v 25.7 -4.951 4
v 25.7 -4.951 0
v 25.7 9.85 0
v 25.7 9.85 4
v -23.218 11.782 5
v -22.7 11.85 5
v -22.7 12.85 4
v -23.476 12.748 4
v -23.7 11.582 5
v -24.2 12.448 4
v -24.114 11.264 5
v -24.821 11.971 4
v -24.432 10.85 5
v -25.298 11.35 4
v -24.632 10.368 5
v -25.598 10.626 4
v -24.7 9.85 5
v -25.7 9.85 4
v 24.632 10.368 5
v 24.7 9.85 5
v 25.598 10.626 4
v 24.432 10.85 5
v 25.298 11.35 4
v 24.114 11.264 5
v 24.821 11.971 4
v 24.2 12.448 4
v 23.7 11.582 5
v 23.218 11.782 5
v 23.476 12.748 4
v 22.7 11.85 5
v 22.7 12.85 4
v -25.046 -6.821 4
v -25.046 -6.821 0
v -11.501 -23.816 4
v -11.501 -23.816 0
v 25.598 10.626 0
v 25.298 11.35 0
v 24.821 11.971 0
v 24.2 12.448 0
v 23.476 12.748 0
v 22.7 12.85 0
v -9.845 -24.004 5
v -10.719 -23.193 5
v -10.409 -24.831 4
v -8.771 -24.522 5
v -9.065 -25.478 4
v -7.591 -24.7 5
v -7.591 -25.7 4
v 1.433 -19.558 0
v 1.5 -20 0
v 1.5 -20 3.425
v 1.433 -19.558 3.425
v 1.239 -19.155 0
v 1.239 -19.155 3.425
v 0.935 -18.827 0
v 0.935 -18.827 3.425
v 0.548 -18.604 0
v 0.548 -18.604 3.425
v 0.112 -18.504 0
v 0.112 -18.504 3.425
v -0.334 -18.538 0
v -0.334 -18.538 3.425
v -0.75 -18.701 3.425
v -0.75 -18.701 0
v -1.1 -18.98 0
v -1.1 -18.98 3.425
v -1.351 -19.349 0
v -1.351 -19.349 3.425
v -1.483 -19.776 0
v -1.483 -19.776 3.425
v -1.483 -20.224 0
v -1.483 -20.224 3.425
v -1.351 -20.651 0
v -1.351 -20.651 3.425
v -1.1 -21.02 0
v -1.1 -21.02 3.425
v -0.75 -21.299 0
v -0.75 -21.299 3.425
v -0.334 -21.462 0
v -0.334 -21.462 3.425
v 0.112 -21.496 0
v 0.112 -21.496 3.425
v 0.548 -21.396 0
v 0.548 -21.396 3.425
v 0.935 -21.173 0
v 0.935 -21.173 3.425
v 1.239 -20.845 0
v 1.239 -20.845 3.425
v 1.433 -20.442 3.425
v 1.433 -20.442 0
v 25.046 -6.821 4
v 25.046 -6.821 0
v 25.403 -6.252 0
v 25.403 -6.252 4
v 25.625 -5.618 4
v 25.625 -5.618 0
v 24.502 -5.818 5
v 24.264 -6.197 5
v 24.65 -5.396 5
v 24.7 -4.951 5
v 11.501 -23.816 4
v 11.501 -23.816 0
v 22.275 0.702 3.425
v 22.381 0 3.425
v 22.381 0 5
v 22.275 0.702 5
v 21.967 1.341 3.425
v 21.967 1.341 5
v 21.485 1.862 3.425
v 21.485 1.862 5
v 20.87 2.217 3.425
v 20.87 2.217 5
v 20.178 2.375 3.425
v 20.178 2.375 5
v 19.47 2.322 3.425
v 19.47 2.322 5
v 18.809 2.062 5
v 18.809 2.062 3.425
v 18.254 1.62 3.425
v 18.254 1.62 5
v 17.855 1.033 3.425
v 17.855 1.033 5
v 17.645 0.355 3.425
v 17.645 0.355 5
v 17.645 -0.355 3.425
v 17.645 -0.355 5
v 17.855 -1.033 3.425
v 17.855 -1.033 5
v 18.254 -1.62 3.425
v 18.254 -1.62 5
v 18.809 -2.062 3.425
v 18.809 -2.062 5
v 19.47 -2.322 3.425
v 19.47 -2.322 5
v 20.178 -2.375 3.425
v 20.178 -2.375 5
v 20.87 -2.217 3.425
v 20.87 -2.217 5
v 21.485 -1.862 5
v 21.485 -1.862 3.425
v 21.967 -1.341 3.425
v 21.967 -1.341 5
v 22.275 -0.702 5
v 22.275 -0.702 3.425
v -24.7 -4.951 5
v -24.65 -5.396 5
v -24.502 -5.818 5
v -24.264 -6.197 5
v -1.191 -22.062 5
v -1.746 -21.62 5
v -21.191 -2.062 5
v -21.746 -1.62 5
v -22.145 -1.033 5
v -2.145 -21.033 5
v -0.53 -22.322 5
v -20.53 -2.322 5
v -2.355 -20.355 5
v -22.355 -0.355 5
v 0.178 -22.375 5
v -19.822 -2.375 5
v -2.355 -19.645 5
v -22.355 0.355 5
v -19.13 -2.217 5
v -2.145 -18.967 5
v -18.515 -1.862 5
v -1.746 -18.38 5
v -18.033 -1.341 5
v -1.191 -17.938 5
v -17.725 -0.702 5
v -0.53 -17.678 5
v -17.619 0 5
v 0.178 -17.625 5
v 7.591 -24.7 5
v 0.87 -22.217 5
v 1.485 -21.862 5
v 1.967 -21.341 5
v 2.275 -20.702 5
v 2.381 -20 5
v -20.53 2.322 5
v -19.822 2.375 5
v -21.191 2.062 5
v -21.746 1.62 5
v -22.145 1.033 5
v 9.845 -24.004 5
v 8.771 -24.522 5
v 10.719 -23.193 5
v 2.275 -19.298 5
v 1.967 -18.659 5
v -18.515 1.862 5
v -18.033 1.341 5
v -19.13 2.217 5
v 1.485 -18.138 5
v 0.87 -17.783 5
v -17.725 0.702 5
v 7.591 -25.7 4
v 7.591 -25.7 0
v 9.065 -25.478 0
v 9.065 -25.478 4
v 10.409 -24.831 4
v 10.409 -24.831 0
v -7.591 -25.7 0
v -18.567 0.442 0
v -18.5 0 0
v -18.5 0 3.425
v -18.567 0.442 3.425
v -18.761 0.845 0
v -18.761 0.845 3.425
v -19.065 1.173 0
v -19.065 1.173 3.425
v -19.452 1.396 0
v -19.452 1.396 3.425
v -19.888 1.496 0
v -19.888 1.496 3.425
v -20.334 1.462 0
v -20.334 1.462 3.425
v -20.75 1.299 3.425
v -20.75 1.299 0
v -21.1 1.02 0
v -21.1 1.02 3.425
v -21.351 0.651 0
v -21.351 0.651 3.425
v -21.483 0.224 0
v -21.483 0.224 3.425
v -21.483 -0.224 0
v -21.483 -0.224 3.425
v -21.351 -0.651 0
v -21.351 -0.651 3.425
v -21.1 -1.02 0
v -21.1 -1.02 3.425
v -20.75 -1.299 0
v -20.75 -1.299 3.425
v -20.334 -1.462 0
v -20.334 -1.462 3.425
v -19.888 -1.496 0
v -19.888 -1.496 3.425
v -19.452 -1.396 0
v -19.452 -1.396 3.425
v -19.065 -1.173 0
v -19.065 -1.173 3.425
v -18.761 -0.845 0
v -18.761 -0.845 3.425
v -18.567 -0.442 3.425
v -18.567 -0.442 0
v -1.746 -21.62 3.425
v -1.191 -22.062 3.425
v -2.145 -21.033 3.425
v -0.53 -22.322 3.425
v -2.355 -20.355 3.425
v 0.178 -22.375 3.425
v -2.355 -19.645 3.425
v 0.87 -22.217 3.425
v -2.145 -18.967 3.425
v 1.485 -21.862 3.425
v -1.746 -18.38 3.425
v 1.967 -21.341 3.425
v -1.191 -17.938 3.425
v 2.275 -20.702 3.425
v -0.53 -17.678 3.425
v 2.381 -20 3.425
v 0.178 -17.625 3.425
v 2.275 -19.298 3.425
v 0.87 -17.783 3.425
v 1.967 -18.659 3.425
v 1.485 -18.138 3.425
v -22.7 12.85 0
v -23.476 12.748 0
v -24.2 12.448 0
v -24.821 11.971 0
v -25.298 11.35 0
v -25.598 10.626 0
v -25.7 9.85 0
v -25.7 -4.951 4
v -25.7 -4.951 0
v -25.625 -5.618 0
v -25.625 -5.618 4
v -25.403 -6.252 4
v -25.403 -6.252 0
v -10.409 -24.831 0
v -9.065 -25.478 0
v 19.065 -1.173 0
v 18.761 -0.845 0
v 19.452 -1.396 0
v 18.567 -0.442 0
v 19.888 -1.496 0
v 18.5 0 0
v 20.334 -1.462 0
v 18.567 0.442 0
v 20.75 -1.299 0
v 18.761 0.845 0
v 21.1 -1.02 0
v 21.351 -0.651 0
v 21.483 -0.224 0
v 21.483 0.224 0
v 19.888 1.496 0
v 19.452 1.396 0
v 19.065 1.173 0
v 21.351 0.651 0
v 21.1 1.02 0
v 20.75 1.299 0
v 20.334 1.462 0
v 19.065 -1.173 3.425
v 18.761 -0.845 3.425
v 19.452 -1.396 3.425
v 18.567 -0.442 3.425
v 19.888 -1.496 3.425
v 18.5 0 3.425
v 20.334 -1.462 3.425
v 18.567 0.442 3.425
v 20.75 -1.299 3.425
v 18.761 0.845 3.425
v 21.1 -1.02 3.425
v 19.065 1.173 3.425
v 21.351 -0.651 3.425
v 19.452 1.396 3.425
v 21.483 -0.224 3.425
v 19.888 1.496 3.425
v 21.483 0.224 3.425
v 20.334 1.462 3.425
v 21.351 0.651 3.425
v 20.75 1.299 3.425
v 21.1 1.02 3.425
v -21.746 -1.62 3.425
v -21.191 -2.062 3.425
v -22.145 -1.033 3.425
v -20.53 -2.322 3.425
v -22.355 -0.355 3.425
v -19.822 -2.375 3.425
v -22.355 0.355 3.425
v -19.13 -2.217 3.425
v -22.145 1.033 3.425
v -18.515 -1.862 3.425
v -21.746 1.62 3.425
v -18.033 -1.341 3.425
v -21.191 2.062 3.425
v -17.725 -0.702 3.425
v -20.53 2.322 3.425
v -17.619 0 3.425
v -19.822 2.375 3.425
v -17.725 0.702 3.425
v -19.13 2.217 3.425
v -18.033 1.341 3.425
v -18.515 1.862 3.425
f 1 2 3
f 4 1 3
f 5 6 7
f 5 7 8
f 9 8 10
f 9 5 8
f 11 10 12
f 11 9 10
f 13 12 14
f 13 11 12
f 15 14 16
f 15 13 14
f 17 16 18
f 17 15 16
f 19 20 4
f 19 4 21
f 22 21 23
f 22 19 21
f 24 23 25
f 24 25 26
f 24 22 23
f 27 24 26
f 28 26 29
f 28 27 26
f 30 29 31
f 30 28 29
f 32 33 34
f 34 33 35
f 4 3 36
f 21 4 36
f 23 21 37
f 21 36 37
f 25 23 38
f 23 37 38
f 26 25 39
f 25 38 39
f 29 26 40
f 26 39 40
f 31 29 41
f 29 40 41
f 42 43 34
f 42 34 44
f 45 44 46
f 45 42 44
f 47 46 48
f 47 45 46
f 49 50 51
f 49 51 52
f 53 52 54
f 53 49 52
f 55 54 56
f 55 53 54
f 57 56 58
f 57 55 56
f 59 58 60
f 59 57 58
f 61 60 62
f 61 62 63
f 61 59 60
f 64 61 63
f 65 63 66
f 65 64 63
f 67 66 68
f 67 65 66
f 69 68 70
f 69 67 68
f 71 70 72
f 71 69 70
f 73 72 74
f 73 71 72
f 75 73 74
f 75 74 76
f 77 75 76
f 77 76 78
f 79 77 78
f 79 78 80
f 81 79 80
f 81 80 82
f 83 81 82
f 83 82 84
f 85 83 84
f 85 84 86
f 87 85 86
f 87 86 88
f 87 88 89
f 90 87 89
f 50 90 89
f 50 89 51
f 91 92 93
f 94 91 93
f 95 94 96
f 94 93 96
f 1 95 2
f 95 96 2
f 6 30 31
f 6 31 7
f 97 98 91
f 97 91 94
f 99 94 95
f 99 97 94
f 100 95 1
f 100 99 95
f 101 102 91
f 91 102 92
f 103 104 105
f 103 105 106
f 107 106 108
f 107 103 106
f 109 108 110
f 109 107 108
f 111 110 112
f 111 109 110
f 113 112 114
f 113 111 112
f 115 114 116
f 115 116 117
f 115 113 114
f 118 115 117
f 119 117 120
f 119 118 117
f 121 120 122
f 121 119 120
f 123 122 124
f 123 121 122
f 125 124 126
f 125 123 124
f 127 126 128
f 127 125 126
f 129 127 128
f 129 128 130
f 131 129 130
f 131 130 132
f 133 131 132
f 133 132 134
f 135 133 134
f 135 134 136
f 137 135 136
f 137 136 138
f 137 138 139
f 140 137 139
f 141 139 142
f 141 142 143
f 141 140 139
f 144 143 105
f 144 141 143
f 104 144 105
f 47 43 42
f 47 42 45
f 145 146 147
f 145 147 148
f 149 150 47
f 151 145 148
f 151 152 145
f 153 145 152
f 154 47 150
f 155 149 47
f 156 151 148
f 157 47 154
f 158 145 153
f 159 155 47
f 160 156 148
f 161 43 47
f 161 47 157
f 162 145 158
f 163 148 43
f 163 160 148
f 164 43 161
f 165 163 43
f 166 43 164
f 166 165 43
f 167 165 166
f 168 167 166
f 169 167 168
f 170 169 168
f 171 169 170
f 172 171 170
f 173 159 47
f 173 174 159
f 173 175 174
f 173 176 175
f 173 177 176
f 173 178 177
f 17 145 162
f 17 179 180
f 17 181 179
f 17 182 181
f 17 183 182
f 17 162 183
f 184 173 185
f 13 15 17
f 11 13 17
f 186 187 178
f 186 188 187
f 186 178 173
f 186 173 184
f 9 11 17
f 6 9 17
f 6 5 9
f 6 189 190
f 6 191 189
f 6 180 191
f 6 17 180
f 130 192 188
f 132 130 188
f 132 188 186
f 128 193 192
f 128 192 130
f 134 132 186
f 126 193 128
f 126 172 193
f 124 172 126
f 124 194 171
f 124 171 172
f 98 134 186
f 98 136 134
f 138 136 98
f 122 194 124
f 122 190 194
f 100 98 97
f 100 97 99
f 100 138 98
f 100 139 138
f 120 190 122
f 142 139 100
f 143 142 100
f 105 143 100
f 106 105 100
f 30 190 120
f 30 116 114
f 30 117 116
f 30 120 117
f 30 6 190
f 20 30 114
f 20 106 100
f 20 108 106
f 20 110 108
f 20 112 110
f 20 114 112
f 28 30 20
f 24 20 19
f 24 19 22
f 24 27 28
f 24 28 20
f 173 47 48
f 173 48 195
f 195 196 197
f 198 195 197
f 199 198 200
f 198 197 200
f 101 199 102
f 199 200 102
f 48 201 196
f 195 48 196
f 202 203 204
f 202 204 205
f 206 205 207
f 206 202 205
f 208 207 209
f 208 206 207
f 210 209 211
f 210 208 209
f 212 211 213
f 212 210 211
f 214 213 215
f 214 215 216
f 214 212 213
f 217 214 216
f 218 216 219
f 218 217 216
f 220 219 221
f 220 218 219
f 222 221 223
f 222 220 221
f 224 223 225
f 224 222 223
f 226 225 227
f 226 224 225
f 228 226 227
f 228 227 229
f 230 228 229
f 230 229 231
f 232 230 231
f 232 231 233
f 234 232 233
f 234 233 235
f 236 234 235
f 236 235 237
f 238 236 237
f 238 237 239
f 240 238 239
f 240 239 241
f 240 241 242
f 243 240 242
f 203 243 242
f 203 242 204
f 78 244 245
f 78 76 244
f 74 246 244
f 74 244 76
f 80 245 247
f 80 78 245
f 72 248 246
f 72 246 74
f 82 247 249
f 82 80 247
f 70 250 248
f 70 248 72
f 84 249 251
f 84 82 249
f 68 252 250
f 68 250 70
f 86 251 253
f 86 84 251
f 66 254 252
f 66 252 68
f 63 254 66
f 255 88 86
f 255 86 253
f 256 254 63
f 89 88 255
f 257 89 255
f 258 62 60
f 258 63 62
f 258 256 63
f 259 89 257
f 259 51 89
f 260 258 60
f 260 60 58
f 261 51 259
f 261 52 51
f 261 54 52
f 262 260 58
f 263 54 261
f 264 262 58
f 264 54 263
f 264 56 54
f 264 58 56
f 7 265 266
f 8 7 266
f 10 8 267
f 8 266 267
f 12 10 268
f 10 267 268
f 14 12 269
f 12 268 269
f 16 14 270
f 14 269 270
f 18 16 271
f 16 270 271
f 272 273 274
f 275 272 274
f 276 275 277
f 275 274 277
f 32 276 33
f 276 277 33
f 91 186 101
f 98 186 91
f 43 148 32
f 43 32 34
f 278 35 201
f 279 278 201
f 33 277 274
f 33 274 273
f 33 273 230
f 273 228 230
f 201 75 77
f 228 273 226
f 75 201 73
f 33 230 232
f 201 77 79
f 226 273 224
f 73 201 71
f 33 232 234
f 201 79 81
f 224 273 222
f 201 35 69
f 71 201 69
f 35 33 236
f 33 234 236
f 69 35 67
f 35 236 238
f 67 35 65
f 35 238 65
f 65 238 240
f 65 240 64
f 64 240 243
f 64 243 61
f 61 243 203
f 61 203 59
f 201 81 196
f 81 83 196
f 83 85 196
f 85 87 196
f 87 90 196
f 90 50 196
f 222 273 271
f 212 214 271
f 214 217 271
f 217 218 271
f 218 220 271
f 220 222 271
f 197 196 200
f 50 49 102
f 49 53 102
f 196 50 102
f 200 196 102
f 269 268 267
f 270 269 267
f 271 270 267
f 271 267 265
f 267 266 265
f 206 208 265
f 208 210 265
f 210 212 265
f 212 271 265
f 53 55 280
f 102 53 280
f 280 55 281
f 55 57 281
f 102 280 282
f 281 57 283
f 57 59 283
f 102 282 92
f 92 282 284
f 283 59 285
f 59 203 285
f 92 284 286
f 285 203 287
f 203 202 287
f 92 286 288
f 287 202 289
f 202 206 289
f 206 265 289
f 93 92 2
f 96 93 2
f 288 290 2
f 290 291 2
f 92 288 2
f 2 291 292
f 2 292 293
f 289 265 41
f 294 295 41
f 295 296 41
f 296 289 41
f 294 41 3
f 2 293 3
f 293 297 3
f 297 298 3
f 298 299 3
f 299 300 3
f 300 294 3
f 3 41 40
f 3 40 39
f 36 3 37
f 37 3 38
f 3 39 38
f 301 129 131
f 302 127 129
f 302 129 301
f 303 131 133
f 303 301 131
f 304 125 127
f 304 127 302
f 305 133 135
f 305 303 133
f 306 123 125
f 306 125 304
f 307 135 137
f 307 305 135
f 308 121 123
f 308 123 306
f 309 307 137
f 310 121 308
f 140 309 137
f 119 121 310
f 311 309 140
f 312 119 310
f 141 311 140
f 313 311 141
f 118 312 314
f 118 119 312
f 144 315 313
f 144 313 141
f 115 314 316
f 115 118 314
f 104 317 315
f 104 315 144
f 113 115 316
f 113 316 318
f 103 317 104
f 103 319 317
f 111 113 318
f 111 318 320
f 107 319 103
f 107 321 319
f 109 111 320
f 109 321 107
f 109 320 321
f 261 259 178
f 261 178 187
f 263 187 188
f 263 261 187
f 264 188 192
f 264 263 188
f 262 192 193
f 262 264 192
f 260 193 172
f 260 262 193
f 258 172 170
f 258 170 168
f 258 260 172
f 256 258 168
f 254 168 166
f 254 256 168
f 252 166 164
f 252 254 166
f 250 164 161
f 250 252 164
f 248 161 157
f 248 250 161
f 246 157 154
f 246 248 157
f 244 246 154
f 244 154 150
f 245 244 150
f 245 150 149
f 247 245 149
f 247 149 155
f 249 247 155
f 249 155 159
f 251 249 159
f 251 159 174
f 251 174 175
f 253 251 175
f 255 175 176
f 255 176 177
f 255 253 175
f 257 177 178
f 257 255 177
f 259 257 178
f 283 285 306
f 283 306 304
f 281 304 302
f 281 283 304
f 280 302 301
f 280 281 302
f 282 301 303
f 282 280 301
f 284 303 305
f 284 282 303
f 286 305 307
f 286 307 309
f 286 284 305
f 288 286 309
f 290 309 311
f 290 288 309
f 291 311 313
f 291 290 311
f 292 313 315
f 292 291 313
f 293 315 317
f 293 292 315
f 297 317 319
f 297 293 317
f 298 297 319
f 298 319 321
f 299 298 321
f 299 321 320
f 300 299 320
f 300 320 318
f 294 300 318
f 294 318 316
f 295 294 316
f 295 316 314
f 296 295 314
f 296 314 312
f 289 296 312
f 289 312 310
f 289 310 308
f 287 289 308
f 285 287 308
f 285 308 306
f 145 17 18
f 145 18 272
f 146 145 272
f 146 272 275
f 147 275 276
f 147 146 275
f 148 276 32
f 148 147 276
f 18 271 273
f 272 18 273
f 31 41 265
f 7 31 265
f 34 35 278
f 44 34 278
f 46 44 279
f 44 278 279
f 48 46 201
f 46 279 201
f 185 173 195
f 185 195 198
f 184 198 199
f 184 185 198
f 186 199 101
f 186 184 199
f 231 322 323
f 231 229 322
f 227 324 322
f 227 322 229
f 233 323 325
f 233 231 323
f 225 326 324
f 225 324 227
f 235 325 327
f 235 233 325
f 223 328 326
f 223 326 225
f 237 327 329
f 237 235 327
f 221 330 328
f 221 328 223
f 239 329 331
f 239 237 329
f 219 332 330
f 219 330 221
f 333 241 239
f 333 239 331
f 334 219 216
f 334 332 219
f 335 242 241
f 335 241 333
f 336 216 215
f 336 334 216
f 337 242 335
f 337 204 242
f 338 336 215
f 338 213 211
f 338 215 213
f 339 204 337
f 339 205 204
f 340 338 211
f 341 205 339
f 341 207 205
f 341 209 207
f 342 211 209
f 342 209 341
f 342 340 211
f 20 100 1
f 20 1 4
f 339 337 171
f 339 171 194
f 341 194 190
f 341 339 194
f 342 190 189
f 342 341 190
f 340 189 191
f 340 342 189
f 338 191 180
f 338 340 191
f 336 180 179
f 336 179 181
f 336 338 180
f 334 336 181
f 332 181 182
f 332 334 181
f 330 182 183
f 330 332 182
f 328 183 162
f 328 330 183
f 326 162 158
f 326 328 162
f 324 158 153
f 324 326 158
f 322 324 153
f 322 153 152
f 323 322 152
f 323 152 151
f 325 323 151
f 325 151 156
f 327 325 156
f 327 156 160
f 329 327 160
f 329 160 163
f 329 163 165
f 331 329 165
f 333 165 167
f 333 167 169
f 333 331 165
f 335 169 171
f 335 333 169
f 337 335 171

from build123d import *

# Parameters (mm, degrees)
CROQUIS1_R                   = 1.5
SALIENTE_EXTRUIR1_DEPTH      = 5
CHAFL_N1_SIZE                = 1
TALADROAVANZADO1_START       = 3.4252
TALADROAVANZADO1_OUTLINE_R   = 2.38125
TALADROAVANZADO1_OUTLINE_R_2 = 1.5
TALADROAVANZADO1_DEPTH       = 1.5748


# Read off the part's stored shape, not the designer's step: TaladroAvanzado1
with BuildPart() as part:
    # Croquis1 → Saliente-Extruir1 (new body)
    with BuildSketch(Plane.XY):
        with BuildLine():
            Line((-7.5911494, -25.7), (7.5911494, -25.7))
            ThreePointArc((7.5911494, -25.7), (9.761282919, -25.204500029), (11.501296, -23.816208204))
            Line((11.501296, -23.816208204), (25.04608796, -6.820513834))
            ThreePointArc((25.04608796, -6.820513834), (25.531807186, -5.941176745), (25.7, -4.950788912))
            Line((25.7, -4.950788912), (25.7, 9.85))
            ThreePointArc((25.7, 9.85), (24.821320344, 11.971320344), (22.7, 12.85))
            Line((22.7, 12.85), (0, 12.85))
            Line((0, 12.85), (-22.7, 12.85))
            ThreePointArc((-22.7, 12.85), (-24.821320344, 11.971320344), (-25.7, 9.85))
            Line((-25.7, 9.85), (-25.7, -4.950788912))
            ThreePointArc((-25.7, -4.950788912), (-25.531807186, -5.941176745), (-25.04608796, -6.820513834))
            Line((-25.04608796, -6.820513834), (-11.501296, -23.816208204))
            ThreePointArc((-11.501296, -23.816208204), (-9.761282919, -25.204500029), (-7.5911494, -25.7))
        make_face()
        with Locations((-20, 0)):
            Circle(CROQUIS1_R, mode=Mode.SUBTRACT)
        with Locations(Location((20, 0, 0), (0, 0, 180))):
            Circle(CROQUIS1_R, mode=Mode.SUBTRACT)
        with Locations((0, -20)):
            Circle(CROQUIS1_R, mode=Mode.SUBTRACT)
    extrude(amount=SALIENTE_EXTRUIR1_DEPTH)

    # Chaflán1
    chafl_n1_edges = [part.edges().sort_by_distance(p)[0] for p in [
        (-25.7, 2.449605544, 5),
        (-25.531807186, -5.941176745, 5),
        (-18.27369198, -15.318361019, 5),
        (-9.761282919, -25.204500029, 5),
        (0, -25.7, 5),
        (9.761282919, -25.204500029, 5),
        (18.27369198, -15.318361019, 5),
        (25.531807186, -5.941176745, 5),
        (25.7, 2.449605544, 5),
        (24.821320344, 11.971320344, 5),
        (0, 12.85, 5),
        (-24.821320344, 11.971320344, 5),
    ]]
    chamfer(chafl_n1_edges, length=CHAFL_N1_SIZE)

    # TaladroAvanzado1 outline → TaladroAvanzado1 (cut)
    # profile 1 of 3: a face of its own
    with BuildSketch(Plane.XY.offset(TALADROAVANZADO1_START)):
        with Locations((0, -20)):
            Circle(TALADROAVANZADO1_OUTLINE_R)
        with Locations((0, -20)):
            Circle(TALADROAVANZADO1_OUTLINE_R_2, mode=Mode.SUBTRACT)
    # profile 2 of 3: a face of its own
    with BuildSketch(Plane.XY.offset(TALADROAVANZADO1_START)):
        with Locations((20, 0)):
            Circle(TALADROAVANZADO1_OUTLINE_R)
        with Locations((20, 0)):
            Circle(TALADROAVANZADO1_OUTLINE_R_2, mode=Mode.SUBTRACT)
    # profile 3 of 3: a face of its own
    with BuildSketch(Plane.XY.offset(TALADROAVANZADO1_START)):
        with Locations((-20, 0)):
            Circle(TALADROAVANZADO1_OUTLINE_R)
        with Locations((-20, 0)):
            Circle(TALADROAVANZADO1_OUTLINE_R_2, mode=Mode.SUBTRACT)
    extrude(amount=TALADROAVANZADO1_DEPTH, mode=Mode.SUBTRACT)


solid = part.part
